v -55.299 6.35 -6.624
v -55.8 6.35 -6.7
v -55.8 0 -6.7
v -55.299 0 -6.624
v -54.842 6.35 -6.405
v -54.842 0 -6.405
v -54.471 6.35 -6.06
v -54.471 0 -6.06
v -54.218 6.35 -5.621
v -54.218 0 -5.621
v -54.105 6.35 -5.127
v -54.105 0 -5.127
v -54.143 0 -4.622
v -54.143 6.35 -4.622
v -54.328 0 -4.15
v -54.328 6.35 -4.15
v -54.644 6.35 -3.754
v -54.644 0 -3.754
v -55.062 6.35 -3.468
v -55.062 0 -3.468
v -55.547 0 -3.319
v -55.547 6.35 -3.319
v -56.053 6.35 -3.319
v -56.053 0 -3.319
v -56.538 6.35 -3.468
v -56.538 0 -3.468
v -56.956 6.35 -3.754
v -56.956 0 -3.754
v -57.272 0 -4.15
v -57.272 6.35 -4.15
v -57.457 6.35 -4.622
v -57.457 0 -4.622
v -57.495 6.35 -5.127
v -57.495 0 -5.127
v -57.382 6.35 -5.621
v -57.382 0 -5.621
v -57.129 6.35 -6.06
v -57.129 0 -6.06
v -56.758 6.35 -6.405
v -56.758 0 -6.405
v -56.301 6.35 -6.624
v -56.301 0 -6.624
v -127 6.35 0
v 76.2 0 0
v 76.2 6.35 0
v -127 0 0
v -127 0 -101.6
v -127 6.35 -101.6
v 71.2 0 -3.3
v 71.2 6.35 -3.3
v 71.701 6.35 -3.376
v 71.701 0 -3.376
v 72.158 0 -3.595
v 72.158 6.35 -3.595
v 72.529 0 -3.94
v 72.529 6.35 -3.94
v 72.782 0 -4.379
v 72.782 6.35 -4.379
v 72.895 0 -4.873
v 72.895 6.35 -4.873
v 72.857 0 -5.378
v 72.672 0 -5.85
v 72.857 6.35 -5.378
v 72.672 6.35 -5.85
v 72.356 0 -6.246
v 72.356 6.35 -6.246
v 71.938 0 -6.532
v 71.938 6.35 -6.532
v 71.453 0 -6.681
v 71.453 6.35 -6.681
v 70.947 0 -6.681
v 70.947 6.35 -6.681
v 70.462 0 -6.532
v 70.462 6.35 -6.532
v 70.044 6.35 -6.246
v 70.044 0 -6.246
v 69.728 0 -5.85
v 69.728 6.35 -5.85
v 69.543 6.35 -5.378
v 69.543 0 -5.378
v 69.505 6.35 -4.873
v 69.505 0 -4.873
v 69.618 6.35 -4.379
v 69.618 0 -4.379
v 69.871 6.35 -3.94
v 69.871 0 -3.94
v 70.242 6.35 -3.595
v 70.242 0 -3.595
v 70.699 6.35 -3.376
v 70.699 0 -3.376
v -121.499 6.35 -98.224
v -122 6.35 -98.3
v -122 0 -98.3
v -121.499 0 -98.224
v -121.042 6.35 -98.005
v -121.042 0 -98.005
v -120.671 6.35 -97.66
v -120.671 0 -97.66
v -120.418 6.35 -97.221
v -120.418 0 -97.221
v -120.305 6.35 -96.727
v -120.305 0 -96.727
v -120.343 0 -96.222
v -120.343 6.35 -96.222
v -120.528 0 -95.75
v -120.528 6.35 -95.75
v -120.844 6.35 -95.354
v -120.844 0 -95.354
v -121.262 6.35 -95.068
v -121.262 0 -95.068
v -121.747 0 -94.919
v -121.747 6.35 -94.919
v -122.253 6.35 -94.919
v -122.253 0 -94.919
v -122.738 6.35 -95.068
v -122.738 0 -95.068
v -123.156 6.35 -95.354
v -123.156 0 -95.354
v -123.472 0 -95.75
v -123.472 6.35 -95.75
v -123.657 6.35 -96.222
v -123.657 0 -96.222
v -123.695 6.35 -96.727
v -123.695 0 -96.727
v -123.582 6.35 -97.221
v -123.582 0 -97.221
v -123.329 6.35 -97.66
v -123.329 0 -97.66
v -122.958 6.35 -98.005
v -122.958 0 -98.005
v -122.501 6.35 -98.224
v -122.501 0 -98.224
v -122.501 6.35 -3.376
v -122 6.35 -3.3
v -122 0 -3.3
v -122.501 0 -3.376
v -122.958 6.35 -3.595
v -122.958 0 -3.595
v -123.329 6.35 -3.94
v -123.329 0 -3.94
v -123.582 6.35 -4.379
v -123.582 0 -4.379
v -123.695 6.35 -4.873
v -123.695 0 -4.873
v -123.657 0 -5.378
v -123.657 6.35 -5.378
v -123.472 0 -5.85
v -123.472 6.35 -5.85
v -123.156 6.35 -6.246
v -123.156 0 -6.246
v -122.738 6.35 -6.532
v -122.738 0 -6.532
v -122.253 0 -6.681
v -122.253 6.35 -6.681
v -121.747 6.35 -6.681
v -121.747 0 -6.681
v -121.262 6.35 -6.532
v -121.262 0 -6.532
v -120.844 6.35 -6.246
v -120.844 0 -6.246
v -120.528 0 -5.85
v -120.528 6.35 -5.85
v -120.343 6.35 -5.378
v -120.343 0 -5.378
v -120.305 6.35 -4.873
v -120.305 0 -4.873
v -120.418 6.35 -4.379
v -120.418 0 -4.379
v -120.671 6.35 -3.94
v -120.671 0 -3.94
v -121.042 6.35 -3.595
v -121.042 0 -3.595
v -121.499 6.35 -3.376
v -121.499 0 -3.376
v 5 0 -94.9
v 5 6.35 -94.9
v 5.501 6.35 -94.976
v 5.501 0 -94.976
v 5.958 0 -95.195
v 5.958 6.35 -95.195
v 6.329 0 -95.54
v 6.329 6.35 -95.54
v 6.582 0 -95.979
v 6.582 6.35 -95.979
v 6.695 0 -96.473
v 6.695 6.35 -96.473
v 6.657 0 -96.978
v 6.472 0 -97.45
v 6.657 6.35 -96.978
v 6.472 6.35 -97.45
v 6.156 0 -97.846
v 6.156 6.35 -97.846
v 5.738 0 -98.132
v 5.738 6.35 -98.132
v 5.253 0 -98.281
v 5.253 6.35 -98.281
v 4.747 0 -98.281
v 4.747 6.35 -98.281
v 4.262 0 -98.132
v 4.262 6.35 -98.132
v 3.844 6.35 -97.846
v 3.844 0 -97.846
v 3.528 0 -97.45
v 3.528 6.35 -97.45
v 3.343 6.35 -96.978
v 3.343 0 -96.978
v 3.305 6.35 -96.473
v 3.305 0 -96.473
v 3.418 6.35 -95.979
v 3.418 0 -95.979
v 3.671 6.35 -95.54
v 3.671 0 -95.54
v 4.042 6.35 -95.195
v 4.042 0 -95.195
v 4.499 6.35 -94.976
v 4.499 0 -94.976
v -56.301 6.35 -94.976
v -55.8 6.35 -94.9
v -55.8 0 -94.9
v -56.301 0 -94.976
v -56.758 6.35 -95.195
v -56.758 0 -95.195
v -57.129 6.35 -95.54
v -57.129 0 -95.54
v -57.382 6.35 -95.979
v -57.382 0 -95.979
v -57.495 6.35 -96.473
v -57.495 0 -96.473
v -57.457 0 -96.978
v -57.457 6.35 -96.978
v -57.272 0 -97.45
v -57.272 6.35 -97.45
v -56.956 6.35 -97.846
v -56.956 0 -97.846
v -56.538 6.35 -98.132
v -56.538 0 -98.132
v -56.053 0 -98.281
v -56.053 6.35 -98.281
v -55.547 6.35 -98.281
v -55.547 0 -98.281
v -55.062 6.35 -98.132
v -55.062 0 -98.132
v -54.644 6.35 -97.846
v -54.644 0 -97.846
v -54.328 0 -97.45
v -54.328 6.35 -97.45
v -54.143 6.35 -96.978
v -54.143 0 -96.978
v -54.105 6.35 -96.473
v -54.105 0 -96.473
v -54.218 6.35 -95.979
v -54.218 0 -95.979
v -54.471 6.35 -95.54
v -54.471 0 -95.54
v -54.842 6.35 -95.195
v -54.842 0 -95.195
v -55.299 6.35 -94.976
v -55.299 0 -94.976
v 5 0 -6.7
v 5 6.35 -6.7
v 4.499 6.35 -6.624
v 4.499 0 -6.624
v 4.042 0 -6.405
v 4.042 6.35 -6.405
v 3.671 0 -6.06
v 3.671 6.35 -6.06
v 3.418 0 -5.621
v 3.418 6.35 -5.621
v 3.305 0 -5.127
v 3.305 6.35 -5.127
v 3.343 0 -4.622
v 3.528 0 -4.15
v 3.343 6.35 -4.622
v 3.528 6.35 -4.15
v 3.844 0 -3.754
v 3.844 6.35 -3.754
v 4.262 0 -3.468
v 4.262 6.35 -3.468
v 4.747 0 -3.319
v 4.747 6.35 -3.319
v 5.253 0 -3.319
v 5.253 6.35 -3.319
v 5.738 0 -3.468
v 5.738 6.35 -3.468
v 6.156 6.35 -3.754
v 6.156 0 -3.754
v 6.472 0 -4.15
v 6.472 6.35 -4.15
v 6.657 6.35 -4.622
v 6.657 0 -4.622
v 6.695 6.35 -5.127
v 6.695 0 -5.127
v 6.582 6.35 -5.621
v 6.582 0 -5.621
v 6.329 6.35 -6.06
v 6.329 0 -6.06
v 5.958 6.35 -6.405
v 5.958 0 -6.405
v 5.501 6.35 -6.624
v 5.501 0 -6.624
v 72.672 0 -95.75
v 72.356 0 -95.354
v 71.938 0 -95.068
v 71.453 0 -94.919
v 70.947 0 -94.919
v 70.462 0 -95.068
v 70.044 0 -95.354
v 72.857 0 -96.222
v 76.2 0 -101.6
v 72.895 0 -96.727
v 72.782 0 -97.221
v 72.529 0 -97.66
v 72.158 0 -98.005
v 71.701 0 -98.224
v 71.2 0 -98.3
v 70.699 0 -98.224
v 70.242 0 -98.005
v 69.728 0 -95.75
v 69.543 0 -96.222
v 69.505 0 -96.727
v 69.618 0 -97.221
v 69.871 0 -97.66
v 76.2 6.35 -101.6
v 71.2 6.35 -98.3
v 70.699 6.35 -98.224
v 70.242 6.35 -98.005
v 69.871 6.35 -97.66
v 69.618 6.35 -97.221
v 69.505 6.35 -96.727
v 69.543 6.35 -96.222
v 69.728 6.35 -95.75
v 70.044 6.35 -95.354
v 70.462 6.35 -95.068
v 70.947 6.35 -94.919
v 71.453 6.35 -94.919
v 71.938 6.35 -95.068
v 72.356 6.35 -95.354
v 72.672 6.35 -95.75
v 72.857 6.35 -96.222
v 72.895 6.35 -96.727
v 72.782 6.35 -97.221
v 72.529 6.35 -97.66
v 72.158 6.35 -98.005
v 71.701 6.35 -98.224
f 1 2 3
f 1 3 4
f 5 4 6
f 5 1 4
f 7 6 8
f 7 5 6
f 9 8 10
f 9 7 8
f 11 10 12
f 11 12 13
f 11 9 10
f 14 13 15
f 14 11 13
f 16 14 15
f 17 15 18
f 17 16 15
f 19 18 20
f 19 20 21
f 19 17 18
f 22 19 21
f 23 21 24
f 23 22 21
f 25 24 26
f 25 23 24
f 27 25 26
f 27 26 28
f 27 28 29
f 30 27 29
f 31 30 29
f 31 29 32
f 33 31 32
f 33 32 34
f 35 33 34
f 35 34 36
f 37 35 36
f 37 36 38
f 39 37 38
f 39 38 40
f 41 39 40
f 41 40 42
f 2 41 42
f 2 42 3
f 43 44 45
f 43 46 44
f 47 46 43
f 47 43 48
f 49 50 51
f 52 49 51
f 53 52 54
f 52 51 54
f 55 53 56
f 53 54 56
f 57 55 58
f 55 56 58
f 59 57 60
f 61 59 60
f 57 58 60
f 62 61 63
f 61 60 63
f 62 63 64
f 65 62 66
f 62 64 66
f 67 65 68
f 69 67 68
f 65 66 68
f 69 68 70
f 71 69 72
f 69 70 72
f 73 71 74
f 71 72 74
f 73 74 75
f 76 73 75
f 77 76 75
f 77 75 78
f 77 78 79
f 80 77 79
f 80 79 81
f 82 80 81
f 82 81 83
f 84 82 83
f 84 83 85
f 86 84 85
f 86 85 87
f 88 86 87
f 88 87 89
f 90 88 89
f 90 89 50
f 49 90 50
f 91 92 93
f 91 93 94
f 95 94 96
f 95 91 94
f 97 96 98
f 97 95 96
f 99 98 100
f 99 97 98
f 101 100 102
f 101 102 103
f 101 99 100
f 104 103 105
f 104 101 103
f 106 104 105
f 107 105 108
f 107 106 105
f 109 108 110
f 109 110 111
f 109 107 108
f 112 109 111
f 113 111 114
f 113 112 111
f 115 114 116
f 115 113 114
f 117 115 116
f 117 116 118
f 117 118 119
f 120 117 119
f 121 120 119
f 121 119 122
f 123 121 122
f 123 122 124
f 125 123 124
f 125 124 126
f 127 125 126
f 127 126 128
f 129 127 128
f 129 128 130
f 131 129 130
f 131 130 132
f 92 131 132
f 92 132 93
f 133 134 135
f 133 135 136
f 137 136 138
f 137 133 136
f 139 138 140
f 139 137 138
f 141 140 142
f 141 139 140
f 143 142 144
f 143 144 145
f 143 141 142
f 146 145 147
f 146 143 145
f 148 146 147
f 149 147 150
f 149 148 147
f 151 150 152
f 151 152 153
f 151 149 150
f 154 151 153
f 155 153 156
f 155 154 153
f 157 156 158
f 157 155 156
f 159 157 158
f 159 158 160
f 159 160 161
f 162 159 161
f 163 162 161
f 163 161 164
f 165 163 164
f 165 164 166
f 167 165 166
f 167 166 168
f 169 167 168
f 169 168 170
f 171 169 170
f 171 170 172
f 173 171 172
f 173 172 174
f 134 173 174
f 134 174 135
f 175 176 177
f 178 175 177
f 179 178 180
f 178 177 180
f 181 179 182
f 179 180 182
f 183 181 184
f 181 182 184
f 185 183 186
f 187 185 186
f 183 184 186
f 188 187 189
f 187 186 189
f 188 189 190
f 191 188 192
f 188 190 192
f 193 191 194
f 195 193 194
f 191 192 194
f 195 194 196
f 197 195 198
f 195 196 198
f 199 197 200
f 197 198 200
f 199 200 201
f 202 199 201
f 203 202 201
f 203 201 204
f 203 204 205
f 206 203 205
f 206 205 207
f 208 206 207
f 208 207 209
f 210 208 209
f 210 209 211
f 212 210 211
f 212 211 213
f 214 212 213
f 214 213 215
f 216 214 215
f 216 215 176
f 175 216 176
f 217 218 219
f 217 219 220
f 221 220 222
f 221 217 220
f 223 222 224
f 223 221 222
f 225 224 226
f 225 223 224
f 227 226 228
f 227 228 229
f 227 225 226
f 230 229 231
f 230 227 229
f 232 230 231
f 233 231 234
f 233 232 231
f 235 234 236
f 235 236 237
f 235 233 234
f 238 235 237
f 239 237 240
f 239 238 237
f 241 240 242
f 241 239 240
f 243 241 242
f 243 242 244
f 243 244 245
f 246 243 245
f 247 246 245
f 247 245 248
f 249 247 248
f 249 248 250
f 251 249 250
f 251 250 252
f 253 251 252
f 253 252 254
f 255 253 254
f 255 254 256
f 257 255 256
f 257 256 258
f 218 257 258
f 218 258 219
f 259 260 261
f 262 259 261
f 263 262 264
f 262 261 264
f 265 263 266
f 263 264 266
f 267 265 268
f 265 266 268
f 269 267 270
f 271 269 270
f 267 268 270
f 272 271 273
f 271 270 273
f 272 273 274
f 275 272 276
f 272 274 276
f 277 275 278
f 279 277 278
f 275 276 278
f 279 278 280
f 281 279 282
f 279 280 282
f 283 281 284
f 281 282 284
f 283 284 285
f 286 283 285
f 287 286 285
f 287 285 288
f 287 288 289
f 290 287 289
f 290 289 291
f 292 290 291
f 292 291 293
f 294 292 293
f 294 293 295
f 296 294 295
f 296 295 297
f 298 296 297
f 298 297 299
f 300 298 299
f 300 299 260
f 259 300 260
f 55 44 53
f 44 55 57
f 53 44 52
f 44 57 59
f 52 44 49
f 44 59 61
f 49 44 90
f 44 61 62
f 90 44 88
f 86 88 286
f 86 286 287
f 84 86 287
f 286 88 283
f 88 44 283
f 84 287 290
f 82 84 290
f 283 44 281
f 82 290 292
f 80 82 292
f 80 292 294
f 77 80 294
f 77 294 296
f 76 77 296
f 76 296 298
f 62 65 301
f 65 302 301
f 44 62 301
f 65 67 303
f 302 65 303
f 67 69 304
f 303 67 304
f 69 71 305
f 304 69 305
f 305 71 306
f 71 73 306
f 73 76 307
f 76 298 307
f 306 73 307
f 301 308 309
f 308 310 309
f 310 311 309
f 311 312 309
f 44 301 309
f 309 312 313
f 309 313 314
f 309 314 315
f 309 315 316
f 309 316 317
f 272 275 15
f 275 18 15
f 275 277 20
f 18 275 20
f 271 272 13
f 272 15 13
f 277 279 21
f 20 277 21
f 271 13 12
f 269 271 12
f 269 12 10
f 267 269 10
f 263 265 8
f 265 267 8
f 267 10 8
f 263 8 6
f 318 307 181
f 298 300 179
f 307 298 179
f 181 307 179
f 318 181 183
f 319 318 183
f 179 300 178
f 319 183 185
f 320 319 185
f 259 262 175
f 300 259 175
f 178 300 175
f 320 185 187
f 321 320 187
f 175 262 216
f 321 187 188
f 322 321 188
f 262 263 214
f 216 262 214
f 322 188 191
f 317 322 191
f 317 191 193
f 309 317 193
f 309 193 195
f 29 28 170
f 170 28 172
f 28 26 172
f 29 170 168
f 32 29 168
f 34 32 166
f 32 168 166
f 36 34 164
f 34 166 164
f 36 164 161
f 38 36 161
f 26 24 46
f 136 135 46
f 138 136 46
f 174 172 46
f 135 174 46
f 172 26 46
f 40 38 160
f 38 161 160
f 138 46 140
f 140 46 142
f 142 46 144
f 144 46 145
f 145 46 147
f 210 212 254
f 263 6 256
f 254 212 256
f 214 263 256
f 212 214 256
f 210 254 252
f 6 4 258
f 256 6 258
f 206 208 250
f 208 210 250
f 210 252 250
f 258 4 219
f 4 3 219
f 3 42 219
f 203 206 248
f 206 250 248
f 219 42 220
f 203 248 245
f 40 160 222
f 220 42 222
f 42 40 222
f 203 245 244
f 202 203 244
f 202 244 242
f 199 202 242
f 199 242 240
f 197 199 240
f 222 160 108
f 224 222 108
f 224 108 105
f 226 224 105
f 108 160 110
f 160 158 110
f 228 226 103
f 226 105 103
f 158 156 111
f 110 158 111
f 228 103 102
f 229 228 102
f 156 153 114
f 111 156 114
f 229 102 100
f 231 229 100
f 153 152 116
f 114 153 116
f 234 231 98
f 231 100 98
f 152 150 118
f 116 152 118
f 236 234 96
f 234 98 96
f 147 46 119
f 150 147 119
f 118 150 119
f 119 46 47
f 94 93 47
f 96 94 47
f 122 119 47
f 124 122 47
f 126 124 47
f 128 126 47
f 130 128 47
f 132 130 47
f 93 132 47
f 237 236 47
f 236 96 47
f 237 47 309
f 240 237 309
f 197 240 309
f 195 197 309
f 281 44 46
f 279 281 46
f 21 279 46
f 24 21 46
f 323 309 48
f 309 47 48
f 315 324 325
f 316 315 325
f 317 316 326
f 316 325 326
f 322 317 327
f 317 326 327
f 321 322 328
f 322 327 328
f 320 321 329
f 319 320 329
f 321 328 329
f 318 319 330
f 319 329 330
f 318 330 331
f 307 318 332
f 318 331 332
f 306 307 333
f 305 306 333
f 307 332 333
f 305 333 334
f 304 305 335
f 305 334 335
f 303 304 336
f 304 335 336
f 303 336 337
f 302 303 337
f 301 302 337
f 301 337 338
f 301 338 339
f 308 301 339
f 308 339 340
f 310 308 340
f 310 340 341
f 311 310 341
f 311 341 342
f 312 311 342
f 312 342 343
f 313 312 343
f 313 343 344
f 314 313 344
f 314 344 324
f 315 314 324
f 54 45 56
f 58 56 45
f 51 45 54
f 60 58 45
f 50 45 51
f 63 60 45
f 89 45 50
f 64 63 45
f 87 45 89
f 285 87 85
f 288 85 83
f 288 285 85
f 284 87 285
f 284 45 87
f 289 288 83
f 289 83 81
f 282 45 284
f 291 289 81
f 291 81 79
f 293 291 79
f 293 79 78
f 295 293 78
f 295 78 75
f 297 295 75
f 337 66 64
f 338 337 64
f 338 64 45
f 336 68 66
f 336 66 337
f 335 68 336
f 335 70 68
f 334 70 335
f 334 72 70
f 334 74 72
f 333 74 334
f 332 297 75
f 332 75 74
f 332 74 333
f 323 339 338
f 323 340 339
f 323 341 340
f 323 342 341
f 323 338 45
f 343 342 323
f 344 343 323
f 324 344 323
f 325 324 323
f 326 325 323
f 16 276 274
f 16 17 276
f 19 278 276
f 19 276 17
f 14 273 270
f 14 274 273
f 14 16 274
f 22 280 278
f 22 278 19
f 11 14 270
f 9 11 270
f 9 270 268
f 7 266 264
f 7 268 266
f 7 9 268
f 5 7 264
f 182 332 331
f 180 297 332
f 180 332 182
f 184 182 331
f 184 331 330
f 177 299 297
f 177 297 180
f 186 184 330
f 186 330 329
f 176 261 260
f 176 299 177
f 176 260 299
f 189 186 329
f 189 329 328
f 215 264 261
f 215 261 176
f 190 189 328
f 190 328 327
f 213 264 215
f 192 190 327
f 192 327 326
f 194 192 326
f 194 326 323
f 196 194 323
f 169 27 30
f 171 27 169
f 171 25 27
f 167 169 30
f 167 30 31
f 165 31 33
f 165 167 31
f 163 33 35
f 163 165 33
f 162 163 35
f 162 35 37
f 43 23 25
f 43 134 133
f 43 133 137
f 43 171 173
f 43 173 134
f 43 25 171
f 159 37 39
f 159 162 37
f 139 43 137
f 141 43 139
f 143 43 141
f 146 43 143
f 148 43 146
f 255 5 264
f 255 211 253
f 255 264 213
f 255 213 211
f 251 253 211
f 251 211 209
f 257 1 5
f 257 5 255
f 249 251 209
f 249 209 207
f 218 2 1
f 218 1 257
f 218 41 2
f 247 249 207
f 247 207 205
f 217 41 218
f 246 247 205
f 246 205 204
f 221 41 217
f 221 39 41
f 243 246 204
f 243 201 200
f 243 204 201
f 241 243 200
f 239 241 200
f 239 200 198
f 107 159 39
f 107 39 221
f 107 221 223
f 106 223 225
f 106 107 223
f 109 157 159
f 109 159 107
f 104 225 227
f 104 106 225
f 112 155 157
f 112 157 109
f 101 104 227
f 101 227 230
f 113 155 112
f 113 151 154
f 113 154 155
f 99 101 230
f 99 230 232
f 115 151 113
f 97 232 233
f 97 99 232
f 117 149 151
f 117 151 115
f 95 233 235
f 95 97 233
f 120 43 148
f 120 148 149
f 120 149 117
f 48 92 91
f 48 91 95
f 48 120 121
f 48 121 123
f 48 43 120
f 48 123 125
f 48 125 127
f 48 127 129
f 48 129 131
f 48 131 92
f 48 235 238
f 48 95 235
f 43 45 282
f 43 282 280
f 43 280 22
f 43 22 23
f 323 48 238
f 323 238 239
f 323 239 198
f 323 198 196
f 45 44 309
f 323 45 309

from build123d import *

# Parameters (mm, degrees)
SKETCH1_W           = 76.2
SKETCH1_H           = 101.6
BOSS_EXTRUDE1_DEPTH = 6.35
SKETCH2_R           = 1.7
CUT_EXTRUDE1_DEPTH  = 128.158650905
SKETCH3_W           = 101.6
SKETCH3_H           = 6.35
BOSS_EXTRUDE2_DEPTH = 50.8


with BuildPart() as part:
    # Sketch1 → Boss-Extrude1 (new body)
    with BuildSketch(Plane(origin=(0, 0, 0), x_dir=(1, 0, 0), z_dir=(0, 1, 0))):
        with Locations((38.1, 50.8)):
            Rectangle(SKETCH1_W, SKETCH1_H)
    extrude(amount=BOSS_EXTRUDE1_DEPTH)

    # Sketch2 → Cut-Extrude1 (cut, through all)
    with BuildSketch(Plane(origin=(0, 6.35, 0), x_dir=(1, 0, 0), z_dir=(0, 1, 0))):
        with Locations(Location((5, 96.6, 0), (0, 0, 270))):
            Circle(SKETCH2_R)
        with Locations(Location((71.2, 96.6, 0), (0, 0, 90))):
            Circle(SKETCH2_R)
        with Locations(Location((71.2, 5, 0), (0, 0, 270))):
            Circle(SKETCH2_R)
        with Locations(Location((5, 5, 0), (0, 0, 90))):
            Circle(SKETCH2_R)
    extrude(amount=-CUT_EXTRUDE1_DEPTH, mode=Mode.SUBTRACT)


with BuildPart() as body_2:
    # Mirror2: mirrored copy
    add(part.part.mirror(Plane.ZY.offset(25.4)))


with BuildPart() as part_1:
    add(part.part)

    add(body_2.part)  # Boss-Extrude2 merges body 2
    # Sketch3 → Boss-Extrude2 (add)
    with BuildSketch(Plane(origin=(-50.8, 0, 0), x_dir=(0, 0, -1), z_dir=(1, 0, 0))):
        with Locations((50.8, 3.175)):
            Rectangle(SKETCH3_W, SKETCH3_H)
    extrude(amount=BOSS_EXTRUDE2_DEPTH)


solid = part_1.part
